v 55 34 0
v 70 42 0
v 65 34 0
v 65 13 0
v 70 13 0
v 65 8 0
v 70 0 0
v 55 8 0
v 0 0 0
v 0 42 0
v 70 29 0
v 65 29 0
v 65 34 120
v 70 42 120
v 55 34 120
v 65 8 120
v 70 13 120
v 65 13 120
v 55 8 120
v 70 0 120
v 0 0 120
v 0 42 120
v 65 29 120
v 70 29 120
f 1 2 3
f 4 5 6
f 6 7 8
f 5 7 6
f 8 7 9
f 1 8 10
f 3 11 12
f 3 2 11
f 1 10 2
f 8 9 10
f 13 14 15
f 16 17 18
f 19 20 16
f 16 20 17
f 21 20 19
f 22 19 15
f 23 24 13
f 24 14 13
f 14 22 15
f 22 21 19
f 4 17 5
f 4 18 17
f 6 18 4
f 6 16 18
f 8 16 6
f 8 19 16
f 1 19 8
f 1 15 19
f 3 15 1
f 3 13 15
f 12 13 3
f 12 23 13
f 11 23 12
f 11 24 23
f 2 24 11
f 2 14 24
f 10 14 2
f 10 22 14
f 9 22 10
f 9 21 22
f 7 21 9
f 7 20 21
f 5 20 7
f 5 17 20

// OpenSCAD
$fn = 32;

// ----------------------------------------------------------------------
// T-slot rail: 70 x 42 mm section, 120 mm long
// ----------------------------------------------------------------------

// --- parameters (mm) ---
profile_height = 120;     // extrusion height
profile_points = 12;      // points of the closed outline

profile = [[0, 0], [70, 0], [70, 13], [65, 13], [65, 8], [55, 8], [55, 34], [65, 34], [65, 29], [70, 29], [70, 42], [0, 42]];  // single closed polygon, 12 points, counter clockwise

// --- the one profile operation ---
linear_extrude(height = profile_height) polygon(points = profile);
